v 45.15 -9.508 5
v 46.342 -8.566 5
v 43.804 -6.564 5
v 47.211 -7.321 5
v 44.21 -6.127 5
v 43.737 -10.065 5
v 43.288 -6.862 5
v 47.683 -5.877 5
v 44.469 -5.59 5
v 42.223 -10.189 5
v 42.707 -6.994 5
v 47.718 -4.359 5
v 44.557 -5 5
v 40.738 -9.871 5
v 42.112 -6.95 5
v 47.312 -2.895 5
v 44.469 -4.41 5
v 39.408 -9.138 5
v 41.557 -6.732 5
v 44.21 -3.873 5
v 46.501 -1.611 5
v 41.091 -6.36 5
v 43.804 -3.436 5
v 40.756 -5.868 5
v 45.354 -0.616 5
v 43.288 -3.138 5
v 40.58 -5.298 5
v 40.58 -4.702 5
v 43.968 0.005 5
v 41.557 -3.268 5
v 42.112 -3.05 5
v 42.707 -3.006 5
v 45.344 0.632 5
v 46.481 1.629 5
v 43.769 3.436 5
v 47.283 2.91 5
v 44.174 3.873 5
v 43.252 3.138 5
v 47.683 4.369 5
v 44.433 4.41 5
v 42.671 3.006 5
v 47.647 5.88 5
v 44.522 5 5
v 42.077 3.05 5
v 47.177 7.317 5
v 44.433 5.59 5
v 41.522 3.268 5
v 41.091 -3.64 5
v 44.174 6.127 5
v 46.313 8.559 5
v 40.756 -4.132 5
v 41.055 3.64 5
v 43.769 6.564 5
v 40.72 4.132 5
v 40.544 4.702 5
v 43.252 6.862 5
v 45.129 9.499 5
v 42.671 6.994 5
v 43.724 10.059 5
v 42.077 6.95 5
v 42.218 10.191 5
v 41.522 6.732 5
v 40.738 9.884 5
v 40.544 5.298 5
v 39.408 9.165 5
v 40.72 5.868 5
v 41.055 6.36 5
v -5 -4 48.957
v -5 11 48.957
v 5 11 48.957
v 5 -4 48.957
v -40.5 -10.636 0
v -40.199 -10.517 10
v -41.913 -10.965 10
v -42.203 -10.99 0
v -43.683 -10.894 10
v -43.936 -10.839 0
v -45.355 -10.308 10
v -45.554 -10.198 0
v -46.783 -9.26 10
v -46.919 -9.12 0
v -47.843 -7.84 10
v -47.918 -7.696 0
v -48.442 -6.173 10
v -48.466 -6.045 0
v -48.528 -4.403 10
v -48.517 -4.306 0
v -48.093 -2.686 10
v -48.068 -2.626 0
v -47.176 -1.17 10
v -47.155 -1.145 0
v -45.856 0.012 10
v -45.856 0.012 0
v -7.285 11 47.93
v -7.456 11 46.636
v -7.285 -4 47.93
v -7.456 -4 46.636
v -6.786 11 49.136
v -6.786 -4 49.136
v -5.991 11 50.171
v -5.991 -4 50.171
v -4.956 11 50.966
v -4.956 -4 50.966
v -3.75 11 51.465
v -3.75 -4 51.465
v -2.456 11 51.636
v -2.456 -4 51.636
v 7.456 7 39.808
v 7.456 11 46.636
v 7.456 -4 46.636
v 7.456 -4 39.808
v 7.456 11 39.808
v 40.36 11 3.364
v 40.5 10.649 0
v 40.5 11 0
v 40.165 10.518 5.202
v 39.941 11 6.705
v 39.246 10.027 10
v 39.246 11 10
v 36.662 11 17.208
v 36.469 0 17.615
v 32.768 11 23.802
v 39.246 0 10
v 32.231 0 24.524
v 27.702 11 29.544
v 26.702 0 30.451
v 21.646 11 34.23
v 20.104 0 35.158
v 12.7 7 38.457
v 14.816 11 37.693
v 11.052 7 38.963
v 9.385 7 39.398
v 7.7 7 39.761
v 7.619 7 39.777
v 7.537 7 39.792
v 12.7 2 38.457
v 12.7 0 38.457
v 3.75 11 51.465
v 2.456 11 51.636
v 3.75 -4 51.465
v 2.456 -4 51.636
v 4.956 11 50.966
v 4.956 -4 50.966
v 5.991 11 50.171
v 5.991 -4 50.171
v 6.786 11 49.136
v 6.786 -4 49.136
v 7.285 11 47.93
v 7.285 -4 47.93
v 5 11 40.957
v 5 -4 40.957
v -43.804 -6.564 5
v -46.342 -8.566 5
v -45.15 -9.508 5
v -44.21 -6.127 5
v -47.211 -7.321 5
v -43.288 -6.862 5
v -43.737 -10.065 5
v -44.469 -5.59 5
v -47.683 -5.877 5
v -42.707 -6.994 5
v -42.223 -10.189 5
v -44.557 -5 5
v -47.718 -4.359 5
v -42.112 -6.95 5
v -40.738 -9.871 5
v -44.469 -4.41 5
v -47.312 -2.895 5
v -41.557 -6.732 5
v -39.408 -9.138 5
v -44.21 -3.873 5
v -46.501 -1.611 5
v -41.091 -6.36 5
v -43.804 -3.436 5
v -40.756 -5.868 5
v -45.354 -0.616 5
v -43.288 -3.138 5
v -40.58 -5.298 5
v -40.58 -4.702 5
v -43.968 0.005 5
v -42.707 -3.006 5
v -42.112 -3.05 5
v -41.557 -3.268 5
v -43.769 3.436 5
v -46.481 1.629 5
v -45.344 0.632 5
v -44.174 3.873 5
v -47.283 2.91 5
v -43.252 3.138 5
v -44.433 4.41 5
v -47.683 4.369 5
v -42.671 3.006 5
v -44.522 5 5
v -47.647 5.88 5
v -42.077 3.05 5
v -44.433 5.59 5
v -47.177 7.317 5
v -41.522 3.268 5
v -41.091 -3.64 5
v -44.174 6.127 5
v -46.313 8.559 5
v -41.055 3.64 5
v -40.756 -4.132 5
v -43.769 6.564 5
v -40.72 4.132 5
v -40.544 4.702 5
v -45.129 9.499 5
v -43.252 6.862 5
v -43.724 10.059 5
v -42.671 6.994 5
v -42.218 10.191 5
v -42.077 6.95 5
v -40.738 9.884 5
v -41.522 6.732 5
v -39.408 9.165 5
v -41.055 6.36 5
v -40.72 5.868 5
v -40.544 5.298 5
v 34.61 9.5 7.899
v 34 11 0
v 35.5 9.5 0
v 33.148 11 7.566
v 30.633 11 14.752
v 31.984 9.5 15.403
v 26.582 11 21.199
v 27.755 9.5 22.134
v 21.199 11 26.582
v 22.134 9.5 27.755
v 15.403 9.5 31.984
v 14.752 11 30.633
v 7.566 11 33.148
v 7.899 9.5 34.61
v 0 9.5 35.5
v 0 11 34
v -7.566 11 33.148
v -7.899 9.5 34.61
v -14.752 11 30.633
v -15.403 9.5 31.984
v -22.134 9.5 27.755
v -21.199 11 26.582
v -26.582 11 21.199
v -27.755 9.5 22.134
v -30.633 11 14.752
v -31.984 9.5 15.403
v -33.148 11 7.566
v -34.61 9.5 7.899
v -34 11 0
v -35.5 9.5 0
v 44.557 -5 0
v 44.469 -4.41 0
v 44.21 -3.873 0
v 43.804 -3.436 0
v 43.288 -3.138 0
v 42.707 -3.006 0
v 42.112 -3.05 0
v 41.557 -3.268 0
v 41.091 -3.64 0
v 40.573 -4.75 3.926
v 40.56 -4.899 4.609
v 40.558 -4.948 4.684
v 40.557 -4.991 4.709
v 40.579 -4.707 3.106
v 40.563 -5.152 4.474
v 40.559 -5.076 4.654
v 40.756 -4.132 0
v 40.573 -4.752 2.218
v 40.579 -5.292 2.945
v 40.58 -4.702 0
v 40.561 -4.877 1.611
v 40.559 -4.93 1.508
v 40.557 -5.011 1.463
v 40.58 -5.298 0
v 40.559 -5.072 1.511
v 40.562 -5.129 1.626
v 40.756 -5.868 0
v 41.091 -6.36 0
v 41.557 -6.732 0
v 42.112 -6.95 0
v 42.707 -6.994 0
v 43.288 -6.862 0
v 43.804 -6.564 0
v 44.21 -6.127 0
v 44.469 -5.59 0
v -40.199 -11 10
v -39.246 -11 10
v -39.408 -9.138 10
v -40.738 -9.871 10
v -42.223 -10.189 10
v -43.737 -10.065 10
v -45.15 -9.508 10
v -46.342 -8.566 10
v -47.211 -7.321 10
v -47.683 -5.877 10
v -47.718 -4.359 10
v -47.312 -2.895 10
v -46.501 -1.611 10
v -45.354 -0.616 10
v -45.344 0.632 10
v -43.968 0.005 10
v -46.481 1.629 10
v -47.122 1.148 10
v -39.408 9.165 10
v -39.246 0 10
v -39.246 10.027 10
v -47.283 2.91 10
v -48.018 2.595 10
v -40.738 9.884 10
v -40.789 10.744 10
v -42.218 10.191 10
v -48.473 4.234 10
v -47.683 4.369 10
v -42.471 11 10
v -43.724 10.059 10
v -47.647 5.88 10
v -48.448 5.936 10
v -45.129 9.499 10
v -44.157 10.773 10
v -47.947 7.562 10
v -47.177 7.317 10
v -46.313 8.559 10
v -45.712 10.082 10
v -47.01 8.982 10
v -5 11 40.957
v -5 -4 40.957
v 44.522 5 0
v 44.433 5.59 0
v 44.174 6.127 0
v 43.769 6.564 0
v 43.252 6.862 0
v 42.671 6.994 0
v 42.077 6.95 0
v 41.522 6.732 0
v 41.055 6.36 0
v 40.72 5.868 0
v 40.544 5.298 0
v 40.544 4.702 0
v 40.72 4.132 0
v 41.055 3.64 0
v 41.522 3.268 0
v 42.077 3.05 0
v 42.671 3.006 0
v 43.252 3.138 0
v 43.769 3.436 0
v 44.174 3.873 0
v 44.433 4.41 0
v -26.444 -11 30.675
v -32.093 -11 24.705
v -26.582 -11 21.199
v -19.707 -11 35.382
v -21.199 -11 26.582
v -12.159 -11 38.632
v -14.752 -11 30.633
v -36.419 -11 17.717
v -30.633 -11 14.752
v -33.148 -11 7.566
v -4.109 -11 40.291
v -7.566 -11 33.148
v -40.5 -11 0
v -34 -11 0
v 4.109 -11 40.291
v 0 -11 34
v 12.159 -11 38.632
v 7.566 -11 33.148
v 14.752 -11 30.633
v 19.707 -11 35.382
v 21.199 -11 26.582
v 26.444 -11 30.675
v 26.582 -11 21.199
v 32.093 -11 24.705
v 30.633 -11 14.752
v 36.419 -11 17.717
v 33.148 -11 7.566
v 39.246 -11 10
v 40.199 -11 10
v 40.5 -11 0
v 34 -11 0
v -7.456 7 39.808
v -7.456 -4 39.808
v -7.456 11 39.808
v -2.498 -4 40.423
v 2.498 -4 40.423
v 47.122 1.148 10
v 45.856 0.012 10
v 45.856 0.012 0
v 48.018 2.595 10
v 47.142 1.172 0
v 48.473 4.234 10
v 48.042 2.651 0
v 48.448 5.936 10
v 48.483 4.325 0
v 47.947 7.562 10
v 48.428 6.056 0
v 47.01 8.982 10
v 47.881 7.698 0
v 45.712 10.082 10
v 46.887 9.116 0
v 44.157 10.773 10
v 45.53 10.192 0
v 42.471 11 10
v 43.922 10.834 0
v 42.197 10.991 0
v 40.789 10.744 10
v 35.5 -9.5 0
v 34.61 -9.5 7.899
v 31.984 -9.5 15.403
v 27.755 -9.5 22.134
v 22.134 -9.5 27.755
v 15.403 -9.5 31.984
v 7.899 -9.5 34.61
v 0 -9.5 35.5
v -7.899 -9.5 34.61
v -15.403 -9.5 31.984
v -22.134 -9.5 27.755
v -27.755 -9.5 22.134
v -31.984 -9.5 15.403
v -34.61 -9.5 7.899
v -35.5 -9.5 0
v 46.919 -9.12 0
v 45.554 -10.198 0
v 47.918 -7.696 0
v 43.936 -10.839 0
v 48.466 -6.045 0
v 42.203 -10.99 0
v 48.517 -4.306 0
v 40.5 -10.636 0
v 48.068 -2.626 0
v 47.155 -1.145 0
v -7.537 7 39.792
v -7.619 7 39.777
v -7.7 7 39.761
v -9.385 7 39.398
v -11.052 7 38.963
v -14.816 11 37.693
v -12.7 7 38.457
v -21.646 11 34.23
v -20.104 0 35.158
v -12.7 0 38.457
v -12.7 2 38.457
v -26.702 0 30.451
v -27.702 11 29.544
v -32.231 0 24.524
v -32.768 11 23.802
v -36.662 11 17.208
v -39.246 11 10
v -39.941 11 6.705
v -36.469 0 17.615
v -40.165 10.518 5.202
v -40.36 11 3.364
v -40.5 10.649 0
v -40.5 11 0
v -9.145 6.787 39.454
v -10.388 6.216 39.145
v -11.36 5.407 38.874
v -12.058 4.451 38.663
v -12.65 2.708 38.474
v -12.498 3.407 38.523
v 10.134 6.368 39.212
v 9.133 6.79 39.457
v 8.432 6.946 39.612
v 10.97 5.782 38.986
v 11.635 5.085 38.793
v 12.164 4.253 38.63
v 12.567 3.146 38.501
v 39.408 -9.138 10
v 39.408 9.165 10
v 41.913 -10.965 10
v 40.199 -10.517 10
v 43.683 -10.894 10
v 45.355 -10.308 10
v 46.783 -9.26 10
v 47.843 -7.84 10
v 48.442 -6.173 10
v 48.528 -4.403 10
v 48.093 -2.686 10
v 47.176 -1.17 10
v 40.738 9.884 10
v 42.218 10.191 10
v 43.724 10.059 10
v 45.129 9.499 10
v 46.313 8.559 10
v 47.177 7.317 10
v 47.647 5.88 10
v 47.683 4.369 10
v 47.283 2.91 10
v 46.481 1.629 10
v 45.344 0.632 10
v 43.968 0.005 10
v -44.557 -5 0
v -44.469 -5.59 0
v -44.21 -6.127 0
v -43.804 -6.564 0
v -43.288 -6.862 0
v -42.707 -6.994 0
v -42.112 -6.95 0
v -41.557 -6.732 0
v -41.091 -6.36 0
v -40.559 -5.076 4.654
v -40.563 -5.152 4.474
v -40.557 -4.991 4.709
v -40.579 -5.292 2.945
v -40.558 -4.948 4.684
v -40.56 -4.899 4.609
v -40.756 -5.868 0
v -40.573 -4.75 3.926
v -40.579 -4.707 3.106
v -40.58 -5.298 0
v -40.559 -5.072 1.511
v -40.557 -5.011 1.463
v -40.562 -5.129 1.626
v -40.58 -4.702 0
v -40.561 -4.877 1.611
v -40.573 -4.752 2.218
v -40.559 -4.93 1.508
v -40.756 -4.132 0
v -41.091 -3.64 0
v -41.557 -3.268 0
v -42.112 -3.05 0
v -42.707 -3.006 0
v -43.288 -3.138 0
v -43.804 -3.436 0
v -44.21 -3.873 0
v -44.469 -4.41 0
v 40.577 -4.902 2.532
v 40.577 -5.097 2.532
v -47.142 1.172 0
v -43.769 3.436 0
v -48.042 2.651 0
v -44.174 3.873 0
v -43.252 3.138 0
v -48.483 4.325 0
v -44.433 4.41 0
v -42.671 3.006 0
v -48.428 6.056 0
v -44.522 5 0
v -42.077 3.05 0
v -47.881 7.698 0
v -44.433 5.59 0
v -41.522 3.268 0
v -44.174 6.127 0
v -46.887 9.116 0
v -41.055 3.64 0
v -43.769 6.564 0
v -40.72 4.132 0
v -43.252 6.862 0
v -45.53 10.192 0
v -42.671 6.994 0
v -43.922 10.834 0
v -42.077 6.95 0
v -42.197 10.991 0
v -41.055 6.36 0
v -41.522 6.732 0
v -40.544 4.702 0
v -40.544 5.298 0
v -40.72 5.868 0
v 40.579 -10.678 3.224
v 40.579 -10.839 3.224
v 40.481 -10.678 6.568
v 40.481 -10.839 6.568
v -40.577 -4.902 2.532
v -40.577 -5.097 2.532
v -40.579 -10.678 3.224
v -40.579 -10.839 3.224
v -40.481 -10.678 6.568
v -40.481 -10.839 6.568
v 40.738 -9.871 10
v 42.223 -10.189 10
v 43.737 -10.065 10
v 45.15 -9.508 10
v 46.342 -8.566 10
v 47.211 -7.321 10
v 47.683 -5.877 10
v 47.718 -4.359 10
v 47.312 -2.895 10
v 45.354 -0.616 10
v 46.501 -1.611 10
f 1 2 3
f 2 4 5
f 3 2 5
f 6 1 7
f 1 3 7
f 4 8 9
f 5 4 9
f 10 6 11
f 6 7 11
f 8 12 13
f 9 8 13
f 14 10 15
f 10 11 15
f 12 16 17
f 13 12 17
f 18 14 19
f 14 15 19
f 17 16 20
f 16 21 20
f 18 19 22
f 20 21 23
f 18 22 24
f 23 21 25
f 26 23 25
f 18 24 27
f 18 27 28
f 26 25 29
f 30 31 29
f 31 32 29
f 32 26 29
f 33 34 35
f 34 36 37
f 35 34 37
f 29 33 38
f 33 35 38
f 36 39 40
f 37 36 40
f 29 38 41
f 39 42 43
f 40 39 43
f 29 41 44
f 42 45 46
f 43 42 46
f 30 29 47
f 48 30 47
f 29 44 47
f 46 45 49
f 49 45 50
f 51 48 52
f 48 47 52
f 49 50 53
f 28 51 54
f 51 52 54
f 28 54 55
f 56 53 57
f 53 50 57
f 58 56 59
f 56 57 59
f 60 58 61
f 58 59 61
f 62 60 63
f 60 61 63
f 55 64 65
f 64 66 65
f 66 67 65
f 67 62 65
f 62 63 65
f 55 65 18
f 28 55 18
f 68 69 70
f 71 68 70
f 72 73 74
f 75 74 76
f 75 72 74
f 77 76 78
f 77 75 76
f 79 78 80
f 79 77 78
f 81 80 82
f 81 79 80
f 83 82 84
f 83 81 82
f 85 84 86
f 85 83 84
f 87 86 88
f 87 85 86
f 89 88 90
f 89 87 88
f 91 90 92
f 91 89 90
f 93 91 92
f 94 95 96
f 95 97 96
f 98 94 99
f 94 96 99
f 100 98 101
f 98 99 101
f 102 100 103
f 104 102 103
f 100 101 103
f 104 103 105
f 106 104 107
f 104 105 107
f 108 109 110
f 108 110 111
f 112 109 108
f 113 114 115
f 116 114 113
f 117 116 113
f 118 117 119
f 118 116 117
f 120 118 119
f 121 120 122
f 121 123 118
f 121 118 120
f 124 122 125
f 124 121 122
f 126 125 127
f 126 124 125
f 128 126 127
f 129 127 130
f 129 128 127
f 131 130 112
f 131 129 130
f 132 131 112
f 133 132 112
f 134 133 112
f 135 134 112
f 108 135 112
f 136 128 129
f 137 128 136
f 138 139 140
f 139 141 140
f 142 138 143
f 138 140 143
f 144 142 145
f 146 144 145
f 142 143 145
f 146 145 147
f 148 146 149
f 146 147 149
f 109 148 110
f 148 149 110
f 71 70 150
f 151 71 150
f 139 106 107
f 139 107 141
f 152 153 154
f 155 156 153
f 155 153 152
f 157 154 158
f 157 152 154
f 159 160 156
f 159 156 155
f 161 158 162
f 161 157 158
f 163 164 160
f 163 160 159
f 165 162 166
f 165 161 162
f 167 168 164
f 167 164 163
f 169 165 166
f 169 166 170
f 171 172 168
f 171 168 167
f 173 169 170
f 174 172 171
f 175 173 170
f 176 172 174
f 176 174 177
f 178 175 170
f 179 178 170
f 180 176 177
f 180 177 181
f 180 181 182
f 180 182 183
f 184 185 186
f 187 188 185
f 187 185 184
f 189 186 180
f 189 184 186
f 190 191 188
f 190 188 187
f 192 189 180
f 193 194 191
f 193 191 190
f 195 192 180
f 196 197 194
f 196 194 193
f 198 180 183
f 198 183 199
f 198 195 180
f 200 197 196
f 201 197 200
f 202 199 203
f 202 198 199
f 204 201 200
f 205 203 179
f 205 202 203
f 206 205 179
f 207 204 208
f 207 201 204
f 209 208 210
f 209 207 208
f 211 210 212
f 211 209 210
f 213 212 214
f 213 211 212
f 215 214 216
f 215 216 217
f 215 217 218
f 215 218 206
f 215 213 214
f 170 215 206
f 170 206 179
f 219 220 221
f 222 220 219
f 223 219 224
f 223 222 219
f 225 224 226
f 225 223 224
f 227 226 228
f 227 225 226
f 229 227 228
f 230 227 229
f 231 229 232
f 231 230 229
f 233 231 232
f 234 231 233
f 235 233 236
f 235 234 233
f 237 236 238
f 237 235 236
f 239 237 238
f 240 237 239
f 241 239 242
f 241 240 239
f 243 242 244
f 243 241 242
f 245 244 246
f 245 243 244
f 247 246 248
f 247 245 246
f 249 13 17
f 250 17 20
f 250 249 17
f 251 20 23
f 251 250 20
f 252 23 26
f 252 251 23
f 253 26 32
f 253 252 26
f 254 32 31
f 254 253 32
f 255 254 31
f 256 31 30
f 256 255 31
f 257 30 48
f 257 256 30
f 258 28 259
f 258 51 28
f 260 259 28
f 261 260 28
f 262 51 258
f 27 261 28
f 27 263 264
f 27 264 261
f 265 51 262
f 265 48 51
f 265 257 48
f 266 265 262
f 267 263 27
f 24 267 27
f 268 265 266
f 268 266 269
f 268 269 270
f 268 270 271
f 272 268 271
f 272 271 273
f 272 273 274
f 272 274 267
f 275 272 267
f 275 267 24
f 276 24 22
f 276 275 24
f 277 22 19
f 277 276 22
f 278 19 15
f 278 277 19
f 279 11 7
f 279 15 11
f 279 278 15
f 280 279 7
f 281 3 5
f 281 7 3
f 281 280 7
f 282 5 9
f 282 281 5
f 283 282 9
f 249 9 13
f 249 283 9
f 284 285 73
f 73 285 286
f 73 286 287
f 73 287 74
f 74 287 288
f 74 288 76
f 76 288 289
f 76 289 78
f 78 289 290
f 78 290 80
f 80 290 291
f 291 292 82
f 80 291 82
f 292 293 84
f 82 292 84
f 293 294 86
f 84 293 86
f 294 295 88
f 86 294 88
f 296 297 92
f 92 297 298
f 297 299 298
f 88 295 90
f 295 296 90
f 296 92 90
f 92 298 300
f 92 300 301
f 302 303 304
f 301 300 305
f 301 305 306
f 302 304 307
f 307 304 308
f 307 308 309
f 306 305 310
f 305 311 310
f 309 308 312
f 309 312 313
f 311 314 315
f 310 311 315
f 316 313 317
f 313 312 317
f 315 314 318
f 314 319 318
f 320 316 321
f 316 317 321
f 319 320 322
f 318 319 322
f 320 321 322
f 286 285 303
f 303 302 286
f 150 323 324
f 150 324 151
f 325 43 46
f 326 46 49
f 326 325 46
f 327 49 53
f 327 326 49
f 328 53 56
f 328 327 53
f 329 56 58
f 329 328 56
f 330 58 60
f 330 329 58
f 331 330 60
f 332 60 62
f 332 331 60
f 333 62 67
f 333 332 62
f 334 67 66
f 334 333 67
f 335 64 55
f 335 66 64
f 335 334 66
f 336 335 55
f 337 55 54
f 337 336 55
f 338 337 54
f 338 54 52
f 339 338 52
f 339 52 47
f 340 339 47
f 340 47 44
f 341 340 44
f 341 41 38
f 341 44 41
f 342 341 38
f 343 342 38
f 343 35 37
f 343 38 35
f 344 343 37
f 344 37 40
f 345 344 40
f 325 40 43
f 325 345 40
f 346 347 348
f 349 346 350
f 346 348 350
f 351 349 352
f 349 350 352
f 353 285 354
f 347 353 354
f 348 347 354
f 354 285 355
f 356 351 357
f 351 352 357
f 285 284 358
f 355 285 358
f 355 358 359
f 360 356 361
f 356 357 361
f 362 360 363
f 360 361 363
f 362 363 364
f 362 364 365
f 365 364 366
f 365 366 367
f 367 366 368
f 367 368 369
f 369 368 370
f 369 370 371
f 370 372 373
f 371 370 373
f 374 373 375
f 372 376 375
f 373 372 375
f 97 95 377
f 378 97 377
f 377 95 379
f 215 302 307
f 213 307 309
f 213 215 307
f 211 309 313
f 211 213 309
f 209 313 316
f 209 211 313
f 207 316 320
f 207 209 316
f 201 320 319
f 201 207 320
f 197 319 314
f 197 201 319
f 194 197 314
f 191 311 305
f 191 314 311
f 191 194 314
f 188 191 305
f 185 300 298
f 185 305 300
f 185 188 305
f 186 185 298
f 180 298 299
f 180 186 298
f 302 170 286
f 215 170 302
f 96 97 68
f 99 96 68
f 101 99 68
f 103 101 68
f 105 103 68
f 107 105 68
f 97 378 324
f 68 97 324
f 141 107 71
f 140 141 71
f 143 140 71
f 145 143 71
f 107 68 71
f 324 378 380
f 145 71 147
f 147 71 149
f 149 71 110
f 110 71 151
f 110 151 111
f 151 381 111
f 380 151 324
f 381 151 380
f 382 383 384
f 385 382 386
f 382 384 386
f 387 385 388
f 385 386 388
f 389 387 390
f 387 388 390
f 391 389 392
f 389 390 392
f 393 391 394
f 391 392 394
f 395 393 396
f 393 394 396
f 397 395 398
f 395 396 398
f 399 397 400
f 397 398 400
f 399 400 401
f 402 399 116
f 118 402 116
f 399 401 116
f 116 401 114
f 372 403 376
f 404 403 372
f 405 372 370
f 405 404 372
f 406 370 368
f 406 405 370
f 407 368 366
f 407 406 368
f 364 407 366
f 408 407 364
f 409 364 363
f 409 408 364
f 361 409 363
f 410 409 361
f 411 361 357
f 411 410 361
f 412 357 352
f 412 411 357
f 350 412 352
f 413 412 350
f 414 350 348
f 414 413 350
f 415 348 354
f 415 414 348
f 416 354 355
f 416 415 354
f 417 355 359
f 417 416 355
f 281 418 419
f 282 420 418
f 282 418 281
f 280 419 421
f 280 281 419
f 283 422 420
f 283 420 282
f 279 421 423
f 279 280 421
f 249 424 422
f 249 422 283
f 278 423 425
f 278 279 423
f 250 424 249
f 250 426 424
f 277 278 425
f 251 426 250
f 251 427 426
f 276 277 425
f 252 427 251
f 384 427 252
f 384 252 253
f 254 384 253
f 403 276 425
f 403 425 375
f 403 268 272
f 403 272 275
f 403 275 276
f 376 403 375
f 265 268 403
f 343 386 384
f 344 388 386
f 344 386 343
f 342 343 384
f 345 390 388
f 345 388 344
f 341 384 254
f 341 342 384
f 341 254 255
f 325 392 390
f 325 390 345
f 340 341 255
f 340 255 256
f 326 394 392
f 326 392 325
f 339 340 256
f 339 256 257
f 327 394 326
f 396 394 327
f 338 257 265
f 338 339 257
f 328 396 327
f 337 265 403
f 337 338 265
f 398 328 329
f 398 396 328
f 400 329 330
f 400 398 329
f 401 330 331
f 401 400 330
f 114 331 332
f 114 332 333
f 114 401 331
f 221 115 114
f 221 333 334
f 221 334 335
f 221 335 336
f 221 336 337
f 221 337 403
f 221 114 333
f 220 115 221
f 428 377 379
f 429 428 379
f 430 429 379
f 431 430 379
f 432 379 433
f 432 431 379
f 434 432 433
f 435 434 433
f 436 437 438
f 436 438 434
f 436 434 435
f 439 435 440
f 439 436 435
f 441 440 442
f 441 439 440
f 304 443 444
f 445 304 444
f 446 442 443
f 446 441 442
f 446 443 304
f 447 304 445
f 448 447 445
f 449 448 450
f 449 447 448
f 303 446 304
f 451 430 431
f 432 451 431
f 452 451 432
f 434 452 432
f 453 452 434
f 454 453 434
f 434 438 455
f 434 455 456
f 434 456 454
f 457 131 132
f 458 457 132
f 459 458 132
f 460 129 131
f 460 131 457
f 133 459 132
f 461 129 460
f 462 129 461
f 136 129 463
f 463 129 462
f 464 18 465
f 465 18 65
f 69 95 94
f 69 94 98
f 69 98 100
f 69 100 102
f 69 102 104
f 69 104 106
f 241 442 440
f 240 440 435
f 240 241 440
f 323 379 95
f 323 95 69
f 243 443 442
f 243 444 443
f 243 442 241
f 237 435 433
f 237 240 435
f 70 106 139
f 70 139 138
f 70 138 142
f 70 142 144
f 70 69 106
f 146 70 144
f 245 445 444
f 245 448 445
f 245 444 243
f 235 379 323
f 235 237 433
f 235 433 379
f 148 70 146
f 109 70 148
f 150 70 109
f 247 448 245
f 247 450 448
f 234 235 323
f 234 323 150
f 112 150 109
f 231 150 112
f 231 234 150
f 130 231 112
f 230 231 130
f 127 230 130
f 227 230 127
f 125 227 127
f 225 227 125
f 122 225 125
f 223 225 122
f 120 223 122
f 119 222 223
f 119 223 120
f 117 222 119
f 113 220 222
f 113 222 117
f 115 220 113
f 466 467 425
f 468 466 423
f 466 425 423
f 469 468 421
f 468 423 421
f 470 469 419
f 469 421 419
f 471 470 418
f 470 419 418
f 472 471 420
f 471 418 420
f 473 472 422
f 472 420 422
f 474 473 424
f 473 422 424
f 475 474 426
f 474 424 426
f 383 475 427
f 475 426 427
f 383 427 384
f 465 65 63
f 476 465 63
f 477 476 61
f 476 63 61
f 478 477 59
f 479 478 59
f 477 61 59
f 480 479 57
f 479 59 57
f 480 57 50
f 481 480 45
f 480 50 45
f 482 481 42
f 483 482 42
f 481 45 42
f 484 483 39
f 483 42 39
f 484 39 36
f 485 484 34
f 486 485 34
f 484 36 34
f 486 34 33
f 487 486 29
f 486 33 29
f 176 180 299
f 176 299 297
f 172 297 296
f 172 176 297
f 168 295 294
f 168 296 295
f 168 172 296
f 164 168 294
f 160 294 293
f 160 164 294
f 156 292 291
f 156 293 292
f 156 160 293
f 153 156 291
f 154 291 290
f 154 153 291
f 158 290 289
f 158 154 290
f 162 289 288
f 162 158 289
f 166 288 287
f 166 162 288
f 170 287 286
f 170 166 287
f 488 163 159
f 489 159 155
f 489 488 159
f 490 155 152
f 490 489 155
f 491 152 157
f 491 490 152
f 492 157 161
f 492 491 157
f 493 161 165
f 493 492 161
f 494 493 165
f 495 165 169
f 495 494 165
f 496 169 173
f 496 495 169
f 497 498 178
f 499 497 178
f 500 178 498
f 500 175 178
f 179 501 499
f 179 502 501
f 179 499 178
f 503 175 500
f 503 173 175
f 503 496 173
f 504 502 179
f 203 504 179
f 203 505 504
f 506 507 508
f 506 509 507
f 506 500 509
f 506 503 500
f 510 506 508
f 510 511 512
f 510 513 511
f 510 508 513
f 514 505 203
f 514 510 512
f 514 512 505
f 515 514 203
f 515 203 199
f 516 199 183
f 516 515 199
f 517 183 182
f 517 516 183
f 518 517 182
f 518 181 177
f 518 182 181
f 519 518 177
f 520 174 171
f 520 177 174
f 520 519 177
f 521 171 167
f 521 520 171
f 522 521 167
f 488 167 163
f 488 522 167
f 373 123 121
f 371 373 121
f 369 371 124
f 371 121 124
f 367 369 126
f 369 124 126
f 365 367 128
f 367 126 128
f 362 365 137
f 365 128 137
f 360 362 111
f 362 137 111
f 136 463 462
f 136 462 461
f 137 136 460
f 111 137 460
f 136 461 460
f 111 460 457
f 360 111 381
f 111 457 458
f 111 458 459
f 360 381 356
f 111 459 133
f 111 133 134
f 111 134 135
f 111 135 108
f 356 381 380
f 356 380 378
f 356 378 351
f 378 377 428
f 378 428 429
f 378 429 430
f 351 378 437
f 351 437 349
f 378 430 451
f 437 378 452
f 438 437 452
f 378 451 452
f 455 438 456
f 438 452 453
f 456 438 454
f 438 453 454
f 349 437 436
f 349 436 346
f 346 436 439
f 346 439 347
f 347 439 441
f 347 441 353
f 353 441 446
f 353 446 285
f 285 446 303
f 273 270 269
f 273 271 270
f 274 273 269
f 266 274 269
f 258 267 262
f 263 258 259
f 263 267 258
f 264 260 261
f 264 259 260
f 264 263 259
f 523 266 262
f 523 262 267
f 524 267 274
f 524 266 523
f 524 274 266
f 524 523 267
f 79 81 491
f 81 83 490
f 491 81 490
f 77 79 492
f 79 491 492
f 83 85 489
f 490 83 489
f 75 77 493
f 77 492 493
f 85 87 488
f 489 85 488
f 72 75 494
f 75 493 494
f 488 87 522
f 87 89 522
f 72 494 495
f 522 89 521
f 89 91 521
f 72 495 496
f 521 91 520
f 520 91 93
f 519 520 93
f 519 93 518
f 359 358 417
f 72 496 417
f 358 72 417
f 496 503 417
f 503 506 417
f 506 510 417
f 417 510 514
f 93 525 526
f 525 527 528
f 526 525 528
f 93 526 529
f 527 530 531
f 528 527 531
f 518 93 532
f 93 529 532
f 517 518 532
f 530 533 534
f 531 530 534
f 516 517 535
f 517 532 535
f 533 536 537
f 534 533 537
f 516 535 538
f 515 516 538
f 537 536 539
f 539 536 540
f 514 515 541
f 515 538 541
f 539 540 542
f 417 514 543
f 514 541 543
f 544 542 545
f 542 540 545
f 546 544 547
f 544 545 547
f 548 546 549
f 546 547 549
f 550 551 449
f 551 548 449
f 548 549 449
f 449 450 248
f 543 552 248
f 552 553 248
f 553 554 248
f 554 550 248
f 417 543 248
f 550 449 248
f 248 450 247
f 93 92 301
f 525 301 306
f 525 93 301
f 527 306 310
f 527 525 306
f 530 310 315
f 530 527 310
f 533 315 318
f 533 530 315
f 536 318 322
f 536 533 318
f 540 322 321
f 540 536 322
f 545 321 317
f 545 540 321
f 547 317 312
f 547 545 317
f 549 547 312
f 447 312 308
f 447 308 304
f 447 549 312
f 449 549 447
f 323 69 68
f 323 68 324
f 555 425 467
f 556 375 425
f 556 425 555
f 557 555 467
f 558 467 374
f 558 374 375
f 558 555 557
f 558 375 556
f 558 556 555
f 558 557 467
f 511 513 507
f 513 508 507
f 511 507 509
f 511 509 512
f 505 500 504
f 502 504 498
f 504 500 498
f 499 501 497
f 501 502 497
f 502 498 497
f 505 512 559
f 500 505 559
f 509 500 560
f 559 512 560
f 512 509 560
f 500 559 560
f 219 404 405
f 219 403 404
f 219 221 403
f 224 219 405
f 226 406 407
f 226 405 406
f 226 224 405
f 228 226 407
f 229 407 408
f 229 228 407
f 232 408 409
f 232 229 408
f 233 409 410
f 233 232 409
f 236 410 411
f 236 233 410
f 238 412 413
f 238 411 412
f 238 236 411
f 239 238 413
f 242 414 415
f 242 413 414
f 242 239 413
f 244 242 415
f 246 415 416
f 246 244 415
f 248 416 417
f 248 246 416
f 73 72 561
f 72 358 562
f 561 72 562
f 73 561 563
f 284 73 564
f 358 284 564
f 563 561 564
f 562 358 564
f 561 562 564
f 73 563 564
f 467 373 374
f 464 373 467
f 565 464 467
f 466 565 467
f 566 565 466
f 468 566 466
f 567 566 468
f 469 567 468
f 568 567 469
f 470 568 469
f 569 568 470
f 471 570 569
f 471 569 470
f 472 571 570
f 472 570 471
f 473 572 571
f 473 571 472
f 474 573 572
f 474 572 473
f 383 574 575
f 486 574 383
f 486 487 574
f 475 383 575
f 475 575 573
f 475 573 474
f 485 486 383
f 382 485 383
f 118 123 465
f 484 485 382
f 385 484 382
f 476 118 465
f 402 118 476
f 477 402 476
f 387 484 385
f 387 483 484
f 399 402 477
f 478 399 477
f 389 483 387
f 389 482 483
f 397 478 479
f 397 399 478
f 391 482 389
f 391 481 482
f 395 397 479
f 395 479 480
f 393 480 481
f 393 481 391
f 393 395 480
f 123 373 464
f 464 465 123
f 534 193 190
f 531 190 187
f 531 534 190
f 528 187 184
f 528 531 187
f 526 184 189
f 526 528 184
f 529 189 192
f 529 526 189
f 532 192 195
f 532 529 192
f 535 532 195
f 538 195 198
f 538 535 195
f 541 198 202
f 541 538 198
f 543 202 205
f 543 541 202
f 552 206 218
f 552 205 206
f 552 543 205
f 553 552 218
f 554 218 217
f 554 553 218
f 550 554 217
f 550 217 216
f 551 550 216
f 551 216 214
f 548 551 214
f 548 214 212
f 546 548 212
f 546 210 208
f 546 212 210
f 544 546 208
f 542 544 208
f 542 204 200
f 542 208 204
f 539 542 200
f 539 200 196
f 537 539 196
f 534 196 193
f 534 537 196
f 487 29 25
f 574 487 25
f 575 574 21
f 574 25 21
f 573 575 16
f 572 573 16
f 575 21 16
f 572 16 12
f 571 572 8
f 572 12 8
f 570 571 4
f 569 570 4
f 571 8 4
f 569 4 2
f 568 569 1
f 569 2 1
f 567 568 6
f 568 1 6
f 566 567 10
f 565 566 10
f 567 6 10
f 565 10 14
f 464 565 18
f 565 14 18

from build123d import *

# Parameters (mm, degrees)
REVOLVE1_ANGLE                  = 180
BOSS_EXTRUDE1_START             = -11
BOSS_EXTRUDE1_DEPTH             = 11
CUT_EXTRUDE1_REACH              = 68.374
BOSS_EXTRUDE2_REACH             = 67.327
BOSS_EXTRUDE2_END_RADIUS        = 40.5
SKETCH6_W                       = 25.4
SKETCH6_H                       = 18
BOSS_EXTRUDE2_DIRECTION_2_DEPTH = 15
SKETCH8_W                       = 4
SKETCH8_H                       = 19.884534
CUT_EXTRUDE3_DEPTH              = 80.722348
FILLET1_START                   = 2
FILLET1_DEPTH                   = 5
FILLET1_START_2                 = -11
FILLET1_2_DEPTH                 = 16.09884
FILLET1_START_3                 = 37
FILLET1_3_DEPTH                 = 28
FILLET1_START_4                 = 62
FILLET1_4_OUTLINE_W             = 4
FILLET1_4_OUTLINE_H             = 5
FILLET1_4_DEPTH                 = 3
FILLET1_START_5                 = 39.17071
FILLET1_5_OUTLINE_W             = 4
FILLET1_5_OUTLINE_H             = 5
FILLET1_5_DEPTH                 = 2.944756
FILLET1_6_DEPTH                 = 6
SKETCH9_R                       = 2
BOSS_EXTRUDE3_DEPTH             = 10
CUT_EXTRUDE4_DEPTH              = 75.187772
CUT_EXTRUDE4_DEPTH_BACK         = 5
CUT_EXTRUDE5_DEPTH              = 85.064413
SKETCH12_W                      = 14.911662
SKETCH12_H                      = 13.358131
SKETCH12_W_2                    = 10
SKETCH12_H_2                    = 8
BOSS_EXTRUDE4_DEPTH             = 15
FILLET2_R                       = 5


with BuildPart() as part:
    # Sketch2 → Revolve1 (revolve, symmetric)
    with BuildSketch(Plane(origin=(0, 0, 0), x_dir=(0, 0, -1), z_dir=(1, 0, 0))) as revolve1_sk:
        Polygon((-34, -11), (-35.5, -9.5), (-35.5, 9.5), (-34, 11), (-35.5, 11), (-40.5, 11), (-40.5, -11), (-35.5, -11), align=None)
    revolve(axis=Axis((0, 0, 0), (0, 1, 0)), revolution_arc=REVOLVE1_ANGLE / 2)
    revolve(revolve1_sk.sketch, axis=Axis((0, 0, 0), (0, -1, 0)), revolution_arc=REVOLVE1_ANGLE / 2)

    # Sketch3 → Boss-Extrude1 (add)
    with BuildSketch(Plane(origin=(0, 0, 0), x_dir=(1, 0, 0), z_dir=(0, 1, 0)).offset(BOSS_EXTRUDE1_START)):
        with BuildLine():
            ThreePointArc((-40.5, 0), (0, -40.5), (40.5, 0))
            add(Edge.make_bspline(
                [(40.5, 0), (41.574904, -20.679763), (31.861074, -51.110818), (0, -51.360442)],
                knots=[0, 0, 0, 0, 1, 1, 1, 1], degree=3))
            add(Edge.make_bspline(
                [(-40.5, 0), (-41.574904, -20.679763), (-31.861074, -51.110818), (0, -51.360442)],
                knots=[0, 0, 0, 0, 1, 1, 1, 1], degree=3))
        make_face()
    extrude(amount=BOSS_EXTRUDE1_DEPTH)

    # Sketch5 → Cut-Extrude1 (cut, up to next)
    with BuildSketch(Plane(origin=(0, 0, 0), x_dir=(1, 0, 0), z_dir=(0, 1, 0)), mode=Mode.PRIVATE) as cut_extrude1_sk1:
        Polygon((32.298595, -50), (-32.298595, -50), (-4.520904, -70.798059), align=None)
    cut_extrude1_tool1 = extrude(cut_extrude1_sk1.sketch, amount=-CUT_EXTRUDE1_REACH, mode=Mode.PRIVATE) & part.part
    add(cut_extrude1_tool1.solids().sort_by_distance((-1.506968, 0, 56.932686))[0], mode=Mode.SUBTRACT)

    # Boss-Extrude2: up to this cylinder (the profile starts outside it)
    boss_extrude2_end = Plane(origin=(0, -2, 0), z_dir=(0, -1, 0)) * Cylinder(BOSS_EXTRUDE2_END_RADIUS, 216.654, mode=Mode.PRIVATE)
    # Sketch6 → Boss-Extrude2 (add, up to the surface)
    with BuildSketch(Plane.XY.offset(50), mode=Mode.PRIVATE) as boss_extrude2_sk1:
        with Locations((0, -2)):
            Rectangle(SKETCH6_W, SKETCH6_H)
    boss_extrude2_tool1 = extrude(boss_extrude2_sk1.sketch, amount=-BOSS_EXTRUDE2_REACH, mode=Mode.PRIVATE) - boss_extrude2_end
    add(boss_extrude2_tool1.solids().sort_by_distance((0, -2, 50))[0])

    # Sketch6 → Boss-Extrude2 direction 2 (add)
    with BuildSketch(Plane.XY.offset(50)):
        with Locations((0, -2)):
            Rectangle(SKETCH6_W, SKETCH6_H)
    extrude(amount=BOSS_EXTRUDE2_DIRECTION_2_DEPTH)

    # Sketch8 → Cut-Extrude3 (cut, through all)
    with BuildSketch(Plane(origin=(0, 11, 0), x_dir=(1, 0, 0), z_dir=(0, 1, 0))):
        with BuildLine():
            Line((15.113165, -40.129156), (15.113165, -45.006528))
            add(Edge.make_bspline(
                [(15.113165, -45.006528), (20.553217, -43.096096), (30.745136, -32.716473), (33.442003, -26.840069)],
                knots=[0, 0, 0, 0, 1, 1, 1, 1], degree=3))
            ThreePointArc((33.442003, -26.840069), (25.17044, -34.716075), (15.113165, -40.129156))
        make_face()
        with BuildLine():
            Line((-15.113165, -40.129156), (-15.113165, -45.006528))
            add(Edge.make_bspline(
                [(-15.113165, -45.006528), (-20.553217, -43.096096), (-30.745136, -32.716473), (-33.442003, -26.840069)],
                knots=[0, 0, 0, 0, 1, 1, 1, 1], degree=3))
            ThreePointArc((-33.442003, -26.840069), (-25.17044, -34.716075), (-15.113165, -40.129156))
        make_face()
        with Locations((0, -52.057733)):
            Rectangle(SKETCH8_W, SKETCH8_H)
    extrude(amount=-CUT_EXTRUDE3_DEPTH, mode=Mode.SUBTRACT)

    # Fillet1: read off the stored shape, not the designer's step
    # Fillet1 outline → Fillet1 (cut)
    with BuildSketch(Plane(origin=(0, 0, 0), x_dir=(1, 0, 0), z_dir=(0, 1, 0)).offset(FILLET1_START)):
        with BuildLine():
            Line((-12.7, -65), (12.7, -65))
            Line((12.7, -65), (12.7, -38.457249))
            ThreePointArc((12.7, -38.457249), (0, -40.5), (-12.7, -38.457249))
            Line((-12.7, -38.457249), (-12.7, -65))
        make_face()
    extrude(amount=FILLET1_DEPTH, mode=Mode.SUBTRACT)

    # Fillet1 2 outline → Fillet1 2 (cut)
    with BuildSketch(Plane(origin=(0, 0, 0), x_dir=(1, 0, 0), z_dir=(0, 1, 0)).offset(FILLET1_START_2)):
        with BuildLine():
            Line((-12.7, -65), (-7.7, -65))
            add(Edge.make_bspline(
                [(-7.7, -65), (-12.7, -65), (-12.7, -60)],
                knots=[0, 0, 0, 1, 1, 1], degree=2, weights=[1, 0.707107, 1]))
            Line((-12.7, -60), (-12.7, -65))
        make_face()
        with BuildLine():
            add(Edge.make_bspline(
                [(7.7, -65), (12.7, -65), (12.7, -60)],
                knots=[0, 0, 0, 1, 1, 1], degree=2, weights=[1, 0.707107, 1]))
            Line((7.7, -65), (12.7, -65))
            Line((12.7, -65), (12.7, -60))
        make_face()
    extrude(amount=FILLET1_2_DEPTH, mode=Mode.SUBTRACT)

    # Fillet1 3 outline → Fillet1 3 (add)
    with BuildSketch(Plane.XY.offset(FILLET1_START_3)):
        with BuildLine():
            add(Edge.make_bspline(
                [(-12.7, 2), (-12.7, 7), (-7.7, 7)],
                knots=[0, 0, 0, 1, 1, 1], degree=2, weights=[1, 0.707107, 1]))
            Line((-12.7, 2), (-2, 2))
            Line((-2, 2), (-2, 7))
            Line((-2, 7), (-7.7, 7))
        make_face()
        with BuildLine():
            Line((2, 7), (2, 2))
            Line((2, 2), (12.7, 2))
            add(Edge.make_bspline(
                [(7.7, 7), (12.7, 7), (12.7, 2)],
                knots=[0, 0, 0, 1, 1, 1], degree=2, weights=[1, 0.707107, 1]))
            Line((7.7, 7), (2, 7))
        make_face()
    extrude(amount=FILLET1_3_DEPTH)

    # Fillet1 4 outline → Fillet1 4 (add)
    with BuildSketch(Plane.XY.offset(FILLET1_START_4)):
        with Locations((0, 4.5)):
            Rectangle(FILLET1_4_OUTLINE_W, FILLET1_4_OUTLINE_H)
    extrude(amount=FILLET1_4_DEPTH)

    # Fillet1 5 outline → Fillet1 5 (add)
    with BuildSketch(Plane.XY.offset(FILLET1_START_5)):
        with Locations((0, 4.5)):
            Rectangle(FILLET1_5_OUTLINE_W, FILLET1_5_OUTLINE_H)
    extrude(amount=FILLET1_5_DEPTH)

    # Fillet1 6 outline → Fillet1 6 (cut)
    with BuildSketch(Plane(origin=(0, 0, 0), x_dir=(1, 0, 0), z_dir=(0, 1, 0)).offset(FILLET1_START)):
        with BuildLine():
            Line((-12.7, -65), (-7.7, -65))
            add(Edge.make_bspline(
                [(-12.7, -60), (-12.7, -60.274102), (-12.679965, -60.548369), (-12.639842, -60.820553), (-12.536378, -61.284433), (-12.482162, -61.478121), (-12.41762, -61.668662), (-12.288664, -61.991396), (-12.22893, -62.125441), (-12.163988, -62.25706), (-11.922281, -62.702191), (-11.720174, -63.002028), (-11.490067, -63.281001), (-10.981001, -63.790067), (-10.702028, -64.020174), (-10.402191, -64.222281), (-9.95706, -64.463988), (-9.825441, -64.52893), (-9.691396, -64.588664), (-9.368662, -64.71762), (-9.178121, -64.782162), (-8.984433, -64.836378), (-8.520553, -64.939842), (-8.248369, -64.979965), (-7.974102, -65), (-7.7, -65)],
                knots=[0, 0, 0, 0, 0, 0.139857, 0.139857, 0.139857, 0.242164, 0.242164, 0.242164, 0.316823, 0.316823, 0.316823, 0.5, 0.5, 0.5, 0.683177, 0.683177, 0.683177, 0.757836, 0.757836, 0.757836, 0.860143, 0.860143, 0.860143, 1, 1, 1, 1, 1], degree=4))
            Line((-12.7, -60), (-12.7, -65))
        make_face()
        with BuildLine():
            Line((12.7, -65), (12.7, -60))
            add(Edge.make_bspline(
                [(12.7, -60), (12.7, -60.274102), (12.679965, -60.548369), (12.639842, -60.820553), (12.536378, -61.284433), (12.482162, -61.478121), (12.41762, -61.668662), (12.288664, -61.991396), (12.22893, -62.125441), (12.163988, -62.25706), (11.922281, -62.702191), (11.720174, -63.002028), (11.490067, -63.281001), (10.981001, -63.790067), (10.702028, -64.020174), (10.402191, -64.222281), (9.95706, -64.463988), (9.825441, -64.52893), (9.691396, -64.588664), (9.368662, -64.71762), (9.178121, -64.782162), (8.984433, -64.836378), (8.520553, -64.939842), (8.248369, -64.979965), (7.974102, -65), (7.7, -65)],
                knots=[0, 0, 0, 0, 0, 0.139857, 0.139857, 0.139857, 0.242164, 0.242164, 0.242164, 0.316823, 0.316823, 0.316823, 0.5, 0.5, 0.5, 0.683177, 0.683177, 0.683177, 0.757836, 0.757836, 0.757836, 0.860143, 0.860143, 0.860143, 1, 1, 1, 1, 1], degree=4))
            Line((7.7, -65), (12.7, -65))
        make_face()
    extrude(amount=FILLET1_6_DEPTH, mode=Mode.SUBTRACT)

    # Sketch9 → Boss-Extrude3 (add)
    # profile 1 of 2: a face of its own
    with BuildSketch(Plane.XY):
        with BuildLine():
            ThreePointArc((39.222943, -0.011905), (42.578982, -10.999961), (45.856052, 0.011905))
            ThreePointArc((45.856052, 0.011905), (42.500013, 10.999961), (39.222943, -0.011905))
        make_face()
        with Locations((42.557445, -5)):
            Circle(SKETCH9_R, mode=Mode.SUBTRACT)
        with Locations((42.52155, 5)):
            Circle(SKETCH9_R, mode=Mode.SUBTRACT)
    # profile 2 of 2: a face of its own
    with BuildSketch(Plane.XY):
        with BuildLine():
            ThreePointArc((-39.222943, -0.011905), (-42.578982, -10.999961), (-45.856052, 0.011905))
            ThreePointArc((-45.856052, 0.011905), (-42.500013, 10.999961), (-39.222943, -0.011905))
        make_face()
        with Locations(Location((-42.557445, -5, 0), (0, 0, 180))):
            Circle(SKETCH9_R, mode=Mode.SUBTRACT)
        with Locations(Location((-42.52155, 5, 0), (0, 0, 180))):
            Circle(SKETCH9_R, mode=Mode.SUBTRACT)
    extrude(amount=BOSS_EXTRUDE3_DEPTH)

    # Sketch10 → Cut-Extrude4 (cut, two sides: drawn at the far end of the back side and taken through both)
    with BuildSketch(Plane.XY.offset(10).offset(-CUT_EXTRUDE4_DEPTH_BACK)):
        with BuildLine():
            Line((39.407769, -9.137577), (39.407769, 9.164657))
            ThreePointArc((39.407769, 9.164657), (47.176604, 7.317427), (43.967661, 0.005126))
            ThreePointArc((43.967661, 0.005126), (47.210797, -7.320844), (39.407769, -9.137577))
        make_face()
        with BuildLine():
            Line((-39.407769, -9.137577), (-39.407769, 9.164657))
            ThreePointArc((-39.407769, 9.164657), (-47.176604, 7.317427), (-43.967661, 0.005126))
            ThreePointArc((-43.967661, 0.005126), (-47.210797, -7.320844), (-39.407769, -9.137577))
        make_face()
    extrude(amount=CUT_EXTRUDE4_DEPTH + CUT_EXTRUDE4_DEPTH_BACK, mode=Mode.SUBTRACT)

    # Sketch11 → Cut-Extrude5 (cut, through all)
    with BuildSketch(Plane(origin=(0, 11, 0), x_dir=(1, 0, 0), z_dir=(0, 1, 0))):
        with BuildLine():
            Line((48.52155, -10), (39.246019, -10))
            ThreePointArc((39.246019, -10), (0, -40.5), (-39.246019, -10))
            Line((-39.246019, -10), (-48.52155, -10))
            Line((-48.52155, -10), (-48.52155, -69.748878))
            Line((-48.52155, -69.748878), (48.52155, -69.748878))
            Line((48.52155, -69.748878), (48.52155, -10))
        make_face()
    extrude(amount=-CUT_EXTRUDE5_DEPTH, mode=Mode.SUBTRACT)

    # Sketch12 → Boss-Extrude4 (add)
    with BuildSketch(Plane(origin=(0, 11, 0), x_dir=(1, 0, 0), z_dir=(0, 1, 0))):
        with Locations((0, -44.956584)):
            Rectangle(SKETCH12_W, SKETCH12_H)
        with Locations((0, -44.956584)):
            Rectangle(SKETCH12_W_2, SKETCH12_H_2, mode=Mode.SUBTRACT)
    extrude(amount=-BOSS_EXTRUDE4_DEPTH)

    # Fillet2
    fillet2_edges = [part.edges().sort_by_distance(p)[0] for p in [
        (-7.455831, 3.5, 51.635649),
        (7.455831, 3.5, 51.635649),
    ]]
    fillet(fillet2_edges, radius=FILLET2_R)


solid = part.part
